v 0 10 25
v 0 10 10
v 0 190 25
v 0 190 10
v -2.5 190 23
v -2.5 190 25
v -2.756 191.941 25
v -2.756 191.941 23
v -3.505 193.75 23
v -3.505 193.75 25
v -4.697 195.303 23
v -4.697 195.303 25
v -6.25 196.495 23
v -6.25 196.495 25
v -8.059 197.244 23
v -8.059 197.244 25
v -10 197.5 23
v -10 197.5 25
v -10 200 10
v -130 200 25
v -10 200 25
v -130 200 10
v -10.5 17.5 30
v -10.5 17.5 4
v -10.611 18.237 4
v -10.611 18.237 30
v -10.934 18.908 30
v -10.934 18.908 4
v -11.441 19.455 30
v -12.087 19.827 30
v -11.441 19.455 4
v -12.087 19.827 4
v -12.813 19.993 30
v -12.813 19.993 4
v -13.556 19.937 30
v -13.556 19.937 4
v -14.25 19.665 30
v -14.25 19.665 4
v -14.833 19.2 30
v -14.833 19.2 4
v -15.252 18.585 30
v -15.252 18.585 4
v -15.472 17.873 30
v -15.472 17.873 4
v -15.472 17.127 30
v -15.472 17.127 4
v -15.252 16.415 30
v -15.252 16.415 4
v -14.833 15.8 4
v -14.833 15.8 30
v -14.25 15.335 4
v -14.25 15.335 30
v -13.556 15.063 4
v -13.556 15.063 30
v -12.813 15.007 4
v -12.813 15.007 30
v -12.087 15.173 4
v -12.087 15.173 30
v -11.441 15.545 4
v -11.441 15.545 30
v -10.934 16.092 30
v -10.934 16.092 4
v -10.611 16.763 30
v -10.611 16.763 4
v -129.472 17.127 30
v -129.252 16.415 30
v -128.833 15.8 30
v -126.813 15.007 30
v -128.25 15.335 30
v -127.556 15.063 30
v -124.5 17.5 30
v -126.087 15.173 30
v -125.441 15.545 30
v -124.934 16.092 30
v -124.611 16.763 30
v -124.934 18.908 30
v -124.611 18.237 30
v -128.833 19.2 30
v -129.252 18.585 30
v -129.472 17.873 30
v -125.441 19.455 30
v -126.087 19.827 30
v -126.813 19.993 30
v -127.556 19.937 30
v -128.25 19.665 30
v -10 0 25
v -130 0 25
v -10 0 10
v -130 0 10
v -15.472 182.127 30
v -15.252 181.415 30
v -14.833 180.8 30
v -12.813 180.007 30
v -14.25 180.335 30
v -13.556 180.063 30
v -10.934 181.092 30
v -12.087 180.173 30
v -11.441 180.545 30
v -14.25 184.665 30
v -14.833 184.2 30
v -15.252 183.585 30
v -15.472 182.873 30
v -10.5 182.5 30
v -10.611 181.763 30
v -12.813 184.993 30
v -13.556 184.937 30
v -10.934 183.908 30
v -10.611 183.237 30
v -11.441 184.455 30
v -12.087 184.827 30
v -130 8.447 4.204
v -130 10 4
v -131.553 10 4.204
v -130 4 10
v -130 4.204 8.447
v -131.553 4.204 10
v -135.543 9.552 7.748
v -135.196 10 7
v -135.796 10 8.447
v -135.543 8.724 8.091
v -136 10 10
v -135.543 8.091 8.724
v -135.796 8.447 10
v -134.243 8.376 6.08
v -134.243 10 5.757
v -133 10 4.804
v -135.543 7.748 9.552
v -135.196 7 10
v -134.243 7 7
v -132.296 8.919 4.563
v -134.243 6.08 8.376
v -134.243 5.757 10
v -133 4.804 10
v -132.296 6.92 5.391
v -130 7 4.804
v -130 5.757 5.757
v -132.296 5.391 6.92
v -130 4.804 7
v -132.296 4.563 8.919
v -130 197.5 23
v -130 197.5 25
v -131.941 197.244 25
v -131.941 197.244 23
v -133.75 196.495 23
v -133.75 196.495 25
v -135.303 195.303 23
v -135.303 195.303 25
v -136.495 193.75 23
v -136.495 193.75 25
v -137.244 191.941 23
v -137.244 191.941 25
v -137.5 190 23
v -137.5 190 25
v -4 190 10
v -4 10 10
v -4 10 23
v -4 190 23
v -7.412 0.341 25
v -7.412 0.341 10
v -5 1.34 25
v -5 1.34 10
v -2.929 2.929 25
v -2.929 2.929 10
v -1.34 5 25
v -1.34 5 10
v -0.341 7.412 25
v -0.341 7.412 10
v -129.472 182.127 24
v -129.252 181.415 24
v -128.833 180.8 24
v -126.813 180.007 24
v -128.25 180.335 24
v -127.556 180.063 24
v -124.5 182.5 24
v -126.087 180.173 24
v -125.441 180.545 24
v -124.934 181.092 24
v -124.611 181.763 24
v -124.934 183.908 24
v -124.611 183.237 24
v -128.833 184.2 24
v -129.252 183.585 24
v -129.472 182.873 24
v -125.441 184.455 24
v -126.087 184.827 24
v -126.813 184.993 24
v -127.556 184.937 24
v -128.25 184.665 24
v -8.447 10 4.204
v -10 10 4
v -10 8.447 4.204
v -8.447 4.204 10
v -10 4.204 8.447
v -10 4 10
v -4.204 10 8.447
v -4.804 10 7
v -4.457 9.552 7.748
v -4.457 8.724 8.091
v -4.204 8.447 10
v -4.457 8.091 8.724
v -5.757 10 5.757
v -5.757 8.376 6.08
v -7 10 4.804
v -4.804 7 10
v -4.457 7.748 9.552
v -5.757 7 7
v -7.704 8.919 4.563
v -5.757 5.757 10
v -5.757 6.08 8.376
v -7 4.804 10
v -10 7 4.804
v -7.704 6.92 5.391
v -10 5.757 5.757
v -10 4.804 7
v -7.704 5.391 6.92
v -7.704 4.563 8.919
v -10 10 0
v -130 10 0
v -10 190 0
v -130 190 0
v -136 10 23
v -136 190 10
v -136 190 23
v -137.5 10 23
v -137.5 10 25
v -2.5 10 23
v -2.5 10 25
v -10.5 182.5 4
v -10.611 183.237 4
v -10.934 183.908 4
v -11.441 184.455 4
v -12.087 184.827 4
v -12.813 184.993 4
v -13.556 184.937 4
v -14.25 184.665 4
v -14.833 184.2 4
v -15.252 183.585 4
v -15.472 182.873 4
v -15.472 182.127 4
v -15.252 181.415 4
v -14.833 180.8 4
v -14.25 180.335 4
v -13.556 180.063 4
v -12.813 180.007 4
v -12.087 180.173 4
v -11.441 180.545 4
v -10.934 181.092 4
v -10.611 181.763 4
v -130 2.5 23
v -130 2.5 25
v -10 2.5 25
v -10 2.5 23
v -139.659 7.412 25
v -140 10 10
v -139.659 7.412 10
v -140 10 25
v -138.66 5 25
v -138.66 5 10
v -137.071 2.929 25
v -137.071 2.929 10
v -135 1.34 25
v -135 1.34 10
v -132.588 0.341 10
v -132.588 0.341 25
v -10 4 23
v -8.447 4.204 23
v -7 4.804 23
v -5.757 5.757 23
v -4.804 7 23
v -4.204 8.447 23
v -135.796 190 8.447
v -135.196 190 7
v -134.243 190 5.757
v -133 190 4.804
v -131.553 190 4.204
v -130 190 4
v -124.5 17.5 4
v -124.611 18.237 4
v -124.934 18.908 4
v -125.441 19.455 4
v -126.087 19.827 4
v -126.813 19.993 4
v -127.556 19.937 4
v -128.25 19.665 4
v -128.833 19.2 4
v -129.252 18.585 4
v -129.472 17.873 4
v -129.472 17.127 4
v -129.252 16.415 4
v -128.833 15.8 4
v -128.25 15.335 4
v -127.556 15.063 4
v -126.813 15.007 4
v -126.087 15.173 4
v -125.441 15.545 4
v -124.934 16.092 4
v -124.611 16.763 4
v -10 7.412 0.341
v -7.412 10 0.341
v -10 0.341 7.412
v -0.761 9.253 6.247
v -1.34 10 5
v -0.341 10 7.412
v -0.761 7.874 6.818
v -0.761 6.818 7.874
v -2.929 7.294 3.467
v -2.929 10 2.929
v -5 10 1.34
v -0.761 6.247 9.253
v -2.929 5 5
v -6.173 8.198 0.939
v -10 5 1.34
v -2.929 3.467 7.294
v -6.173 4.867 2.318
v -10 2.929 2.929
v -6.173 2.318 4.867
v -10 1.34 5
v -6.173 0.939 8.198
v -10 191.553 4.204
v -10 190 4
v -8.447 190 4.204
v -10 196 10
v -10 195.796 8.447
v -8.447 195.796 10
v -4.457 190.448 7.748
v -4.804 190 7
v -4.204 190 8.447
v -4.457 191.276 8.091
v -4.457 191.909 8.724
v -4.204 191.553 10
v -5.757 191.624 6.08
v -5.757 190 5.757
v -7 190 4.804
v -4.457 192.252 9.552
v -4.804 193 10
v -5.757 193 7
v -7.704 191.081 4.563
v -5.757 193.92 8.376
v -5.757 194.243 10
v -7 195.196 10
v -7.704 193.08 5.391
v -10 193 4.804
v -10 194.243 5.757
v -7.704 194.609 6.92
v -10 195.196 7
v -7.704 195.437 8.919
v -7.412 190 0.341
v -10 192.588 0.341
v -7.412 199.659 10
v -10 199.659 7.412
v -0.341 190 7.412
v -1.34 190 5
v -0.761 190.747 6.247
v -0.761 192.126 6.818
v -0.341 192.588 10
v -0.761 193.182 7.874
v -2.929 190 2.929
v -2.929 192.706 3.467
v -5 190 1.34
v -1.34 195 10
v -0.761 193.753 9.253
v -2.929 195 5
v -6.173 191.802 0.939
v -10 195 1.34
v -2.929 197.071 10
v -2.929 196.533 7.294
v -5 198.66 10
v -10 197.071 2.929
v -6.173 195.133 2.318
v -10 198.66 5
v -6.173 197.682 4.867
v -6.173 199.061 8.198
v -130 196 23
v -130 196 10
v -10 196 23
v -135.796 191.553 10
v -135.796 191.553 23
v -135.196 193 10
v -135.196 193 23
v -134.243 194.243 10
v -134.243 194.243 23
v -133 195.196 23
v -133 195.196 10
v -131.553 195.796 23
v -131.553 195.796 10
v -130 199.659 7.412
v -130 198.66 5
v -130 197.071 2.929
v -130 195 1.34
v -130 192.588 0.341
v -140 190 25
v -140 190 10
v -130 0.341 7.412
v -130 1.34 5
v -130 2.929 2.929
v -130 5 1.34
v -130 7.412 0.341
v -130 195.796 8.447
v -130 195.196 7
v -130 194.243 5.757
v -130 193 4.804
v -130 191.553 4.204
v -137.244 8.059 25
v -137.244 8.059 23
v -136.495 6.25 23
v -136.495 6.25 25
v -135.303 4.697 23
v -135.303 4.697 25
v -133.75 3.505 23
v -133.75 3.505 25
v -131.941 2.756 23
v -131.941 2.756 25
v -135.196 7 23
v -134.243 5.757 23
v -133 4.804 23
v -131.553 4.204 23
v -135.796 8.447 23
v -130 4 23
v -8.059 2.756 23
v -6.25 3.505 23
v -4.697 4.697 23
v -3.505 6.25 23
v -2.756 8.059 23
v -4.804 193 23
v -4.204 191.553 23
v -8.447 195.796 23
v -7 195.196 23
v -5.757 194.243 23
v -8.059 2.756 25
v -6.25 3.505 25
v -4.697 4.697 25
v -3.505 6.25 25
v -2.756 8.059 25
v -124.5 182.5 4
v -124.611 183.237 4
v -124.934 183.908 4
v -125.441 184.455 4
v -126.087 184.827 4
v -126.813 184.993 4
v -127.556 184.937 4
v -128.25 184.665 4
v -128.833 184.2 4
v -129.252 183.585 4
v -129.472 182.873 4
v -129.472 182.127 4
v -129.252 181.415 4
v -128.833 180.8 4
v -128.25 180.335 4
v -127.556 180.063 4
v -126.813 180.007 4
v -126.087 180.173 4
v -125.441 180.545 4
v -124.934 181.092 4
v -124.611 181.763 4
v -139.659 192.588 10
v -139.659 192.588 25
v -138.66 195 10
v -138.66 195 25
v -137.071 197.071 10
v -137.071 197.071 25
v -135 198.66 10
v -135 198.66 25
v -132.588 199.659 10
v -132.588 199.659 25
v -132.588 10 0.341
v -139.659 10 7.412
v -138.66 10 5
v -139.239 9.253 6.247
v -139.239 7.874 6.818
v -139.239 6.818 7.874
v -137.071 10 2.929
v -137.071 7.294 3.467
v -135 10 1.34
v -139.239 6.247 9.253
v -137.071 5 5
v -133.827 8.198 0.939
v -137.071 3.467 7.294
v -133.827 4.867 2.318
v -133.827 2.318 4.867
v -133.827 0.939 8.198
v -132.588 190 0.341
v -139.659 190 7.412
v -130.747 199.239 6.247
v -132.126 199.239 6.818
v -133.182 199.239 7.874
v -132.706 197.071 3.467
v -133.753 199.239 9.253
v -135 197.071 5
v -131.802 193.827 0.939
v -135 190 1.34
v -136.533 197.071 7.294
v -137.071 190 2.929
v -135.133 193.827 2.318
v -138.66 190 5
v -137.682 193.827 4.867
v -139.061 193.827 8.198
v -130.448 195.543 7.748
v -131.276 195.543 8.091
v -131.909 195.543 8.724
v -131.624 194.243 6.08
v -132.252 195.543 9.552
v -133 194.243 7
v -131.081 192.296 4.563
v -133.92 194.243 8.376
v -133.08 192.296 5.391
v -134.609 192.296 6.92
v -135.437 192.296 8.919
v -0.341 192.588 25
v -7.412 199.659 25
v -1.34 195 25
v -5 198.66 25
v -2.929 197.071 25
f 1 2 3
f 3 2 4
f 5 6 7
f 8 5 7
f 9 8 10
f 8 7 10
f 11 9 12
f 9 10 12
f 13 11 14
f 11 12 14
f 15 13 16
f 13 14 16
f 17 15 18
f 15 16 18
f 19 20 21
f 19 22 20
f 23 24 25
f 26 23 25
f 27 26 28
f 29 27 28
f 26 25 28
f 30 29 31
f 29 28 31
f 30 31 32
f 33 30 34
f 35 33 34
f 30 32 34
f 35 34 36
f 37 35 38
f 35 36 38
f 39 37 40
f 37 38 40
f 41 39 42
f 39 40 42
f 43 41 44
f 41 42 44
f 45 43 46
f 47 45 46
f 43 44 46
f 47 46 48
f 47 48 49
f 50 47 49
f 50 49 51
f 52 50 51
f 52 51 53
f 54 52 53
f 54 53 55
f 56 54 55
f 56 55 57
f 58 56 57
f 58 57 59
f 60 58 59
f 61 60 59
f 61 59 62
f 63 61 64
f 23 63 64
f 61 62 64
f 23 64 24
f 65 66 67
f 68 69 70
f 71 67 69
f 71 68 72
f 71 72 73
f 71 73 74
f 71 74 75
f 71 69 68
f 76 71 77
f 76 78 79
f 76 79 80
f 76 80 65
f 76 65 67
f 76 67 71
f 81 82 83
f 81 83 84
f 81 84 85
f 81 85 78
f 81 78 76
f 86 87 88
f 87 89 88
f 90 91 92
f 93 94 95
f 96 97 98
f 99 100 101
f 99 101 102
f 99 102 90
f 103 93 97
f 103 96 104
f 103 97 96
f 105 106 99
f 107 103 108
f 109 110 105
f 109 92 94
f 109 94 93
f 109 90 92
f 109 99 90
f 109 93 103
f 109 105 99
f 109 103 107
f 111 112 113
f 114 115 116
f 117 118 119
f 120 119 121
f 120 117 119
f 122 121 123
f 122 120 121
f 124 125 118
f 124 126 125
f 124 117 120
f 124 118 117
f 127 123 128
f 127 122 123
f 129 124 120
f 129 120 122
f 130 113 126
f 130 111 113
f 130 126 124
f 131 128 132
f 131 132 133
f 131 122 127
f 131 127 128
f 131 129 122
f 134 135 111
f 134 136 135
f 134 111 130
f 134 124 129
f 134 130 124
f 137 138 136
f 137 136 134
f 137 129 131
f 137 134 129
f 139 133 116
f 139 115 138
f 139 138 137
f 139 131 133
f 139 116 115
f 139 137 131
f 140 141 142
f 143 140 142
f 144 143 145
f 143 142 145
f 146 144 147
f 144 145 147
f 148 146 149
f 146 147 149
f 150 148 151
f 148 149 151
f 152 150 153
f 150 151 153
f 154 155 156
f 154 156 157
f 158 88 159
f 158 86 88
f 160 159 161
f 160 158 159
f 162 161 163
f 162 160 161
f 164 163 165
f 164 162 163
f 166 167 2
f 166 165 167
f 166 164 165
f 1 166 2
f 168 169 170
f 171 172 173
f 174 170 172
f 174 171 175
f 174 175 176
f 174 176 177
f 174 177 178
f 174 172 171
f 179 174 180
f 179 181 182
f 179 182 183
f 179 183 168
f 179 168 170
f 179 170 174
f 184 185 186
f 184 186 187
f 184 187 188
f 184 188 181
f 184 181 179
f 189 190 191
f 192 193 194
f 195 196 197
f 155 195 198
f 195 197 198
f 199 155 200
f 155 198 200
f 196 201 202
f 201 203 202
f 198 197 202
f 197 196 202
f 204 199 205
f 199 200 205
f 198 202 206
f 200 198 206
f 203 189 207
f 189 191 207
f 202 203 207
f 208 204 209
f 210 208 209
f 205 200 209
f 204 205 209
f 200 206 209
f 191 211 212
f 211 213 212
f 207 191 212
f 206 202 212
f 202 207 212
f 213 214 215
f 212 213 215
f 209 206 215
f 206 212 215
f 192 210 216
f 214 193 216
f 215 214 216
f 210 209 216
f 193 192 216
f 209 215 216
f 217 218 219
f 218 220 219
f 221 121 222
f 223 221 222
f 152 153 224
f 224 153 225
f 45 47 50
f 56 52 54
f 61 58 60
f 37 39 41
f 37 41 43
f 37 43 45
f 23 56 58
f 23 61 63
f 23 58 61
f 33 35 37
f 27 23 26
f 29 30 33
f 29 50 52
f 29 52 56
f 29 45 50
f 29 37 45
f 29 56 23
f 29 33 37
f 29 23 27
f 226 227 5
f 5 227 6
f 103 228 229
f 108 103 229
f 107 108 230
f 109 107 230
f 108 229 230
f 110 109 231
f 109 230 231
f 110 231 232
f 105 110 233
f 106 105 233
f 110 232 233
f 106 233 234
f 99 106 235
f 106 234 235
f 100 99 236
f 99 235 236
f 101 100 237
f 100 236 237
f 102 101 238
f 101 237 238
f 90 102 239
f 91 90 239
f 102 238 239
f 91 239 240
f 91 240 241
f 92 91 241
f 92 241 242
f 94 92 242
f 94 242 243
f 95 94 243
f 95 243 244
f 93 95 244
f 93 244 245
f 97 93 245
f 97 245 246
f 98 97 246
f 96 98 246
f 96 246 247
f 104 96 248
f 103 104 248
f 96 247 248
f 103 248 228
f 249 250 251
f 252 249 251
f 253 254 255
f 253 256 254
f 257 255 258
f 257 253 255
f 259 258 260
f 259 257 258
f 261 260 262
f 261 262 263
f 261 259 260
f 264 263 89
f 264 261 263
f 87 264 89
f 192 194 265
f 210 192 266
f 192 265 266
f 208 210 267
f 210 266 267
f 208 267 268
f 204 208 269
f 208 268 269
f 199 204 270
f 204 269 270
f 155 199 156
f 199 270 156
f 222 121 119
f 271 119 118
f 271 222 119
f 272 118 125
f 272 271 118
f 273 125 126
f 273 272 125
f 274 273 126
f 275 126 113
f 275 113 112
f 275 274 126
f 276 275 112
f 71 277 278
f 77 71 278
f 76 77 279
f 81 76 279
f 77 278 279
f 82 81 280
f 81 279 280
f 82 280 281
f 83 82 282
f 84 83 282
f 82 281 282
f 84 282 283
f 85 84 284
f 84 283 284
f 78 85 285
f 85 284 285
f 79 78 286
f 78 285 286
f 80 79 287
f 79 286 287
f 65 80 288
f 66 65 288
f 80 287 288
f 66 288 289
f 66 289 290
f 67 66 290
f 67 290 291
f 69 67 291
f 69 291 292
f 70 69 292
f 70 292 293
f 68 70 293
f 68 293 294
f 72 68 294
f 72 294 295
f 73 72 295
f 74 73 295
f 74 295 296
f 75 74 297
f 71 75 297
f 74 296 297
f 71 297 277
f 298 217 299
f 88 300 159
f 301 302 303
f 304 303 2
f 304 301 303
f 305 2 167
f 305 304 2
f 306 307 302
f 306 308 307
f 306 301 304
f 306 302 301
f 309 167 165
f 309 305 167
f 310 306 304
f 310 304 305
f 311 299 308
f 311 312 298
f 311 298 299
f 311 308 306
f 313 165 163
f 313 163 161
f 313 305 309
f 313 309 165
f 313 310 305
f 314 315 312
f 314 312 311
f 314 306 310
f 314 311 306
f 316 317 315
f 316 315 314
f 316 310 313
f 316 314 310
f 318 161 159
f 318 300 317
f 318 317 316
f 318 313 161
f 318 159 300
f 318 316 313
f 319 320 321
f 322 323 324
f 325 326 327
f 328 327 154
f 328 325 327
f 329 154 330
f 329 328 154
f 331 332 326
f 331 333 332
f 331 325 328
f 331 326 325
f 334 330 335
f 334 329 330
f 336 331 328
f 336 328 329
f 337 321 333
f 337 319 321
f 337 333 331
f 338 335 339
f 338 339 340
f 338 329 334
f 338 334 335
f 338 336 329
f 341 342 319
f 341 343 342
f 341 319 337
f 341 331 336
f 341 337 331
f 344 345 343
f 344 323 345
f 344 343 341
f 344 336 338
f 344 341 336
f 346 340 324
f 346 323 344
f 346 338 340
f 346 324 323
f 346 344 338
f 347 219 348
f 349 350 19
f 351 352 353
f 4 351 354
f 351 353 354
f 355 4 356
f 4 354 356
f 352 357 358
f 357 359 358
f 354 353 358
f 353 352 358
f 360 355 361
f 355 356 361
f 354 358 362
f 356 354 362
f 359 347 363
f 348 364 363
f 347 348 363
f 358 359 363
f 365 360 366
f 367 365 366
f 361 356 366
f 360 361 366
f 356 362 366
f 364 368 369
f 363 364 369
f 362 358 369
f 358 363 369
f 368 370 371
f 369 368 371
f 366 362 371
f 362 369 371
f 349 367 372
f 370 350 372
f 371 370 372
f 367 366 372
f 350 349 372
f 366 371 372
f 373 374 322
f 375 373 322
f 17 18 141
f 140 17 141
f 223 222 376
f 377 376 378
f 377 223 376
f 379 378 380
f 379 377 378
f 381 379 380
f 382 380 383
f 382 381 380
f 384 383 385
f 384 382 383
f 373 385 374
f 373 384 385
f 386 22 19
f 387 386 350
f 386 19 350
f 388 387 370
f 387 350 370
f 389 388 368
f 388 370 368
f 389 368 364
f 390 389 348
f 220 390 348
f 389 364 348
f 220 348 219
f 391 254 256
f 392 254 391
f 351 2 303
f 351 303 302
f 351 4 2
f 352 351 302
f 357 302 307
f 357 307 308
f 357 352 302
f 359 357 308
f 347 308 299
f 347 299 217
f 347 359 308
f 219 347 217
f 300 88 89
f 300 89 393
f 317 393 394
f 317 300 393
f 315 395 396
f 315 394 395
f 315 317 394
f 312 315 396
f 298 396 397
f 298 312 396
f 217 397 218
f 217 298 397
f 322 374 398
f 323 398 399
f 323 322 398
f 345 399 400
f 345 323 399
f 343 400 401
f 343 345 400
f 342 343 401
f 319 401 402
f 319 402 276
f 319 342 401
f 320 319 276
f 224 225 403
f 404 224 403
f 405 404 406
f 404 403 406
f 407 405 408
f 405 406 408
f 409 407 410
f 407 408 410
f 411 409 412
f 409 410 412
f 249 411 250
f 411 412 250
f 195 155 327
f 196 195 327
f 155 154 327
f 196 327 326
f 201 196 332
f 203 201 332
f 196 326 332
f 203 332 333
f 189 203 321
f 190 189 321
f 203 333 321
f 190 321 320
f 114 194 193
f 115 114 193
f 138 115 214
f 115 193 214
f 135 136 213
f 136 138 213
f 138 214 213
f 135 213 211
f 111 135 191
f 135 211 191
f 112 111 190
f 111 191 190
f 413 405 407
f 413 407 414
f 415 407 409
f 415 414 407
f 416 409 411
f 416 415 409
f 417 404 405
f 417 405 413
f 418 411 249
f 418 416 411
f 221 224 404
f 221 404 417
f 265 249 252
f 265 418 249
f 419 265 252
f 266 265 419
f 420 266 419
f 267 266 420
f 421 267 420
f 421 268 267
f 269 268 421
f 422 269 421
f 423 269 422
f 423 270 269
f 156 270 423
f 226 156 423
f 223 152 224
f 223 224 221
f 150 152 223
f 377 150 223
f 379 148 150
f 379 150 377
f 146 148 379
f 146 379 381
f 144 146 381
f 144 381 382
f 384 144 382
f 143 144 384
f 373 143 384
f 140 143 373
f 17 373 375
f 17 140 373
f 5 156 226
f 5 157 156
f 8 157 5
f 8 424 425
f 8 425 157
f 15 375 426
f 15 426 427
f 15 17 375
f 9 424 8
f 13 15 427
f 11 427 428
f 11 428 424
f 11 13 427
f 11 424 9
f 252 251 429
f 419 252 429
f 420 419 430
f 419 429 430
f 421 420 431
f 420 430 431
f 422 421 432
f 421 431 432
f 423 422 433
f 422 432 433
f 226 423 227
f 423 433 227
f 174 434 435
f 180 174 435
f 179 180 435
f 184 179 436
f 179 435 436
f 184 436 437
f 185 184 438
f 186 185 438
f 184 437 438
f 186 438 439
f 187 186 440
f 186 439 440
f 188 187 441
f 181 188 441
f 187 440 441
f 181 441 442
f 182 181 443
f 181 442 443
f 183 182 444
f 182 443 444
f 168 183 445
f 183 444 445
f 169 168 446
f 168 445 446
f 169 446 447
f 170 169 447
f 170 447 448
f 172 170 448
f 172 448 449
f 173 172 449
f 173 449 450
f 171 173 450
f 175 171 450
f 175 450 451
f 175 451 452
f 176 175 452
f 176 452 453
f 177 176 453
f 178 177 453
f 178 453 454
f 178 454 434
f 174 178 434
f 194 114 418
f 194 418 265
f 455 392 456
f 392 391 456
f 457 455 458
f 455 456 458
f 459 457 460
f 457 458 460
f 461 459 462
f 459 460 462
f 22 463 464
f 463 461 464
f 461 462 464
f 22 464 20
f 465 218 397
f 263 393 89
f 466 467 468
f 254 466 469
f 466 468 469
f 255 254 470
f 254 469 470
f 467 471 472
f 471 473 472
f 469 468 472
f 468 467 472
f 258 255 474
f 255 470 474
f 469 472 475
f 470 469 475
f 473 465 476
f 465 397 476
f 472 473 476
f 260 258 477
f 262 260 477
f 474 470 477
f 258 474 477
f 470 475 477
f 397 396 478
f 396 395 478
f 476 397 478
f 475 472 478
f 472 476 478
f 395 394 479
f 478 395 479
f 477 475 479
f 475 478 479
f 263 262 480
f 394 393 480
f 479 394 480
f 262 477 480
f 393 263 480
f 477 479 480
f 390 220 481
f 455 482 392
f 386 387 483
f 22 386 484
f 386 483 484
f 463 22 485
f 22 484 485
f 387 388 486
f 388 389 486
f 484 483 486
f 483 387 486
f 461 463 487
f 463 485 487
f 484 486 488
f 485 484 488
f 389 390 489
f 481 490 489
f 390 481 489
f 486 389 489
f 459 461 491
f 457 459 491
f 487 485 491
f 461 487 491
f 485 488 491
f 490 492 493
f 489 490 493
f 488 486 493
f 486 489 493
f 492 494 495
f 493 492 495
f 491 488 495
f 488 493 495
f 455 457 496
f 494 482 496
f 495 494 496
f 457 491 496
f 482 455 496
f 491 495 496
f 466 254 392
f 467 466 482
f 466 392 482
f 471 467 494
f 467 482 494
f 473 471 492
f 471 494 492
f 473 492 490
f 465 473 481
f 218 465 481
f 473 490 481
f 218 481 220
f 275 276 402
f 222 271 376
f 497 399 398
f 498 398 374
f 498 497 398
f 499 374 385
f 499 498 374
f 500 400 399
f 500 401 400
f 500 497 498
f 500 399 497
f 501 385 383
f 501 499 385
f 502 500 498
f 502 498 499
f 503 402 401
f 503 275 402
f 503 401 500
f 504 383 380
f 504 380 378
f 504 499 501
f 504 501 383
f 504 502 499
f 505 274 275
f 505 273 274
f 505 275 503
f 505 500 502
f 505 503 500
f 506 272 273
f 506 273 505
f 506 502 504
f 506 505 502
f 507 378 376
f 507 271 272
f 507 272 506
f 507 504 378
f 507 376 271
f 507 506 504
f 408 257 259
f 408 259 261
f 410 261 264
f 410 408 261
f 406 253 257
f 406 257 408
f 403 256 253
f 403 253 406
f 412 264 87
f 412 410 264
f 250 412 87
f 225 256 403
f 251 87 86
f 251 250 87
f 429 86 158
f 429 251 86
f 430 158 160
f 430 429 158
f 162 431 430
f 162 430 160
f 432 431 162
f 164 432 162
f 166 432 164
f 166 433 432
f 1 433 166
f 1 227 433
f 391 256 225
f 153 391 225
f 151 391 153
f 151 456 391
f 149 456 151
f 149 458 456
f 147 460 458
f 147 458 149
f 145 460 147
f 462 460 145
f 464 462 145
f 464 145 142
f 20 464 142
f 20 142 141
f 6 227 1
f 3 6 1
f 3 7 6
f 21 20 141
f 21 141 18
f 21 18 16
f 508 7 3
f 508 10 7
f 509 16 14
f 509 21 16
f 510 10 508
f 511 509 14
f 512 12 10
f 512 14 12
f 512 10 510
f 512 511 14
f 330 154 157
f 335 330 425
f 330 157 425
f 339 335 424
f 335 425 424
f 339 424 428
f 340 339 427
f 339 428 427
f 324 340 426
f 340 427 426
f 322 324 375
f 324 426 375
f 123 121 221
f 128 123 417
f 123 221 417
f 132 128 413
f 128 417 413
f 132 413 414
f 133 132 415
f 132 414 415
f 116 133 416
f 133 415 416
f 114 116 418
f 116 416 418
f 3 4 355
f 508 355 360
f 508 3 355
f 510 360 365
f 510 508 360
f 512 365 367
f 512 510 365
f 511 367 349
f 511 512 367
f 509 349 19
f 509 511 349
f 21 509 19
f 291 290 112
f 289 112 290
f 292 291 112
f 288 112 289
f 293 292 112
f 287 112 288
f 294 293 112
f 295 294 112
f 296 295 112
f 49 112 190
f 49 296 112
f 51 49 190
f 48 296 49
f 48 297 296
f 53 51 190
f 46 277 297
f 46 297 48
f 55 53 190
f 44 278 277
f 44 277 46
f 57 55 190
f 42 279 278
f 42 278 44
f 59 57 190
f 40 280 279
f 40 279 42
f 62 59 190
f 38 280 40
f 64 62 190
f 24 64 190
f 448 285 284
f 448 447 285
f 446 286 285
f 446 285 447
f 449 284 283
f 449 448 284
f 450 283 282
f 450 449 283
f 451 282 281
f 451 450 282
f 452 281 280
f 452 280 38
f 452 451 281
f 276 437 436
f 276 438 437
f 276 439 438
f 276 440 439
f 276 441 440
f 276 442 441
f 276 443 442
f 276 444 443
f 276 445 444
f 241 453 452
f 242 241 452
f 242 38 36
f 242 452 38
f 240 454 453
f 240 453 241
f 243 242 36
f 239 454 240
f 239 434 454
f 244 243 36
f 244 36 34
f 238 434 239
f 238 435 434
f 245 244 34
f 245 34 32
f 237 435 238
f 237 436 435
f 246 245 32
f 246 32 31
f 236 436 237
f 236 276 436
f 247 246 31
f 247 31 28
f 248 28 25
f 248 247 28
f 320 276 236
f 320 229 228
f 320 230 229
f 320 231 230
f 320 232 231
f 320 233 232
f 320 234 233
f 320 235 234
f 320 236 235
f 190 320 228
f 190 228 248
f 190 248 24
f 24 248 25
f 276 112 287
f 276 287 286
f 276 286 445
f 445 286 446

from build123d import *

# Parameters (mm, degrees)
F0_W     = 140
F0_H     = 200
F1_DEPTH = 25
F2_R     = 10
F3_T     = -4
F5_DEPTH = 2
F6_R     = 2.5
F7_DEPTH = 26
F8_R     = 2.5
F9_DEPTH = 6


with BuildPart() as f1:
    # F0 (on Top) → F1 (new body)
    with BuildSketch(Plane.XY):
        with Locations((-70, 100)):
            Rectangle(F0_W, F0_H)
    extrude(amount=F1_DEPTH)

    # F2
    f2_edges = [f1.edges().sort_by_distance(p)[0] for p in [
        (-70, 0, 0),
        (-140, 100, 0),
        (-70, 200, 0),
        (0, 100, 0),
        (-140, 0, 12.5),
        (0, 0, 12.5),
        (0, 200, 12.5),
        (-140, 200, 12.5),
    ]]
    fillet(f2_edges, radius=F2_R)

    # F3
    f3_openings = [f1.faces().sort_by_distance(p)[0] for p in [
        (-70, 100, 25),
    ]]
    offset(amount=F3_T, openings=f3_openings)

    # F4 (on face) → F5 (cut)
    with BuildSketch(Plane.XY.offset(25)):
        with BuildLine():
            Line((-2.5, 10), (-2.5, 190))
            ThreePointArc((-2.5, 190), (-4.6966991411, 195.3033008589), (-10, 197.5))
            Line((-10, 197.5), (-130, 197.5))
            ThreePointArc((-130, 197.5), (-135.3033008589, 195.3033008589), (-137.5, 190))
            Line((-137.5, 190), (-137.5, 10))
            ThreePointArc((-137.5, 10), (-135.3033008589, 4.6966991411), (-130, 2.5))
            Line((-130, 2.5), (-10, 2.5))
            ThreePointArc((-10, 2.5), (-4.6966991411, 4.6966991411), (-2.5, 10))
        make_face()
        with BuildLine():
            ThreePointArc((-136, 190), (-134.2426406871, 194.2426406871), (-130, 196))
            Line((-130, 196), (-10, 196))
            ThreePointArc((-10, 196), (-5.7573593129, 194.2426406871), (-4, 190))
            Line((-4, 190), (-4, 10))
            ThreePointArc((-4, 10), (-5.7573593129, 5.7573593129), (-10, 4))
            Line((-10, 4), (-130, 4))
            ThreePointArc((-130, 4), (-134.2426406871, 5.7573593129), (-136, 10))
            Line((-136, 10), (-136, 190))
        make_face(mode=Mode.SUBTRACT)
    extrude(amount=-F5_DEPTH, mode=Mode.SUBTRACT)

    # F6 (on face) → F7 (join)
    with BuildSketch(Plane.XY.offset(4)):
        with Locations((-127, 182.5)):
            Circle(F6_R)
        with Locations((-13, 182.5)):
            Circle(F6_R)
        with Locations((-127, 17.5)):
            Circle(F6_R)
        with Locations((-13, 17.5)):
            Circle(F6_R)
    extrude(amount=F7_DEPTH)

    # F8 (on face) → F9 (cut)
    with BuildSketch(Plane.XY.offset(30)):
        with Locations((-127, 182.5)):
            Circle(F8_R)
    extrude(amount=-F9_DEPTH, mode=Mode.SUBTRACT)


solid = f1.part
